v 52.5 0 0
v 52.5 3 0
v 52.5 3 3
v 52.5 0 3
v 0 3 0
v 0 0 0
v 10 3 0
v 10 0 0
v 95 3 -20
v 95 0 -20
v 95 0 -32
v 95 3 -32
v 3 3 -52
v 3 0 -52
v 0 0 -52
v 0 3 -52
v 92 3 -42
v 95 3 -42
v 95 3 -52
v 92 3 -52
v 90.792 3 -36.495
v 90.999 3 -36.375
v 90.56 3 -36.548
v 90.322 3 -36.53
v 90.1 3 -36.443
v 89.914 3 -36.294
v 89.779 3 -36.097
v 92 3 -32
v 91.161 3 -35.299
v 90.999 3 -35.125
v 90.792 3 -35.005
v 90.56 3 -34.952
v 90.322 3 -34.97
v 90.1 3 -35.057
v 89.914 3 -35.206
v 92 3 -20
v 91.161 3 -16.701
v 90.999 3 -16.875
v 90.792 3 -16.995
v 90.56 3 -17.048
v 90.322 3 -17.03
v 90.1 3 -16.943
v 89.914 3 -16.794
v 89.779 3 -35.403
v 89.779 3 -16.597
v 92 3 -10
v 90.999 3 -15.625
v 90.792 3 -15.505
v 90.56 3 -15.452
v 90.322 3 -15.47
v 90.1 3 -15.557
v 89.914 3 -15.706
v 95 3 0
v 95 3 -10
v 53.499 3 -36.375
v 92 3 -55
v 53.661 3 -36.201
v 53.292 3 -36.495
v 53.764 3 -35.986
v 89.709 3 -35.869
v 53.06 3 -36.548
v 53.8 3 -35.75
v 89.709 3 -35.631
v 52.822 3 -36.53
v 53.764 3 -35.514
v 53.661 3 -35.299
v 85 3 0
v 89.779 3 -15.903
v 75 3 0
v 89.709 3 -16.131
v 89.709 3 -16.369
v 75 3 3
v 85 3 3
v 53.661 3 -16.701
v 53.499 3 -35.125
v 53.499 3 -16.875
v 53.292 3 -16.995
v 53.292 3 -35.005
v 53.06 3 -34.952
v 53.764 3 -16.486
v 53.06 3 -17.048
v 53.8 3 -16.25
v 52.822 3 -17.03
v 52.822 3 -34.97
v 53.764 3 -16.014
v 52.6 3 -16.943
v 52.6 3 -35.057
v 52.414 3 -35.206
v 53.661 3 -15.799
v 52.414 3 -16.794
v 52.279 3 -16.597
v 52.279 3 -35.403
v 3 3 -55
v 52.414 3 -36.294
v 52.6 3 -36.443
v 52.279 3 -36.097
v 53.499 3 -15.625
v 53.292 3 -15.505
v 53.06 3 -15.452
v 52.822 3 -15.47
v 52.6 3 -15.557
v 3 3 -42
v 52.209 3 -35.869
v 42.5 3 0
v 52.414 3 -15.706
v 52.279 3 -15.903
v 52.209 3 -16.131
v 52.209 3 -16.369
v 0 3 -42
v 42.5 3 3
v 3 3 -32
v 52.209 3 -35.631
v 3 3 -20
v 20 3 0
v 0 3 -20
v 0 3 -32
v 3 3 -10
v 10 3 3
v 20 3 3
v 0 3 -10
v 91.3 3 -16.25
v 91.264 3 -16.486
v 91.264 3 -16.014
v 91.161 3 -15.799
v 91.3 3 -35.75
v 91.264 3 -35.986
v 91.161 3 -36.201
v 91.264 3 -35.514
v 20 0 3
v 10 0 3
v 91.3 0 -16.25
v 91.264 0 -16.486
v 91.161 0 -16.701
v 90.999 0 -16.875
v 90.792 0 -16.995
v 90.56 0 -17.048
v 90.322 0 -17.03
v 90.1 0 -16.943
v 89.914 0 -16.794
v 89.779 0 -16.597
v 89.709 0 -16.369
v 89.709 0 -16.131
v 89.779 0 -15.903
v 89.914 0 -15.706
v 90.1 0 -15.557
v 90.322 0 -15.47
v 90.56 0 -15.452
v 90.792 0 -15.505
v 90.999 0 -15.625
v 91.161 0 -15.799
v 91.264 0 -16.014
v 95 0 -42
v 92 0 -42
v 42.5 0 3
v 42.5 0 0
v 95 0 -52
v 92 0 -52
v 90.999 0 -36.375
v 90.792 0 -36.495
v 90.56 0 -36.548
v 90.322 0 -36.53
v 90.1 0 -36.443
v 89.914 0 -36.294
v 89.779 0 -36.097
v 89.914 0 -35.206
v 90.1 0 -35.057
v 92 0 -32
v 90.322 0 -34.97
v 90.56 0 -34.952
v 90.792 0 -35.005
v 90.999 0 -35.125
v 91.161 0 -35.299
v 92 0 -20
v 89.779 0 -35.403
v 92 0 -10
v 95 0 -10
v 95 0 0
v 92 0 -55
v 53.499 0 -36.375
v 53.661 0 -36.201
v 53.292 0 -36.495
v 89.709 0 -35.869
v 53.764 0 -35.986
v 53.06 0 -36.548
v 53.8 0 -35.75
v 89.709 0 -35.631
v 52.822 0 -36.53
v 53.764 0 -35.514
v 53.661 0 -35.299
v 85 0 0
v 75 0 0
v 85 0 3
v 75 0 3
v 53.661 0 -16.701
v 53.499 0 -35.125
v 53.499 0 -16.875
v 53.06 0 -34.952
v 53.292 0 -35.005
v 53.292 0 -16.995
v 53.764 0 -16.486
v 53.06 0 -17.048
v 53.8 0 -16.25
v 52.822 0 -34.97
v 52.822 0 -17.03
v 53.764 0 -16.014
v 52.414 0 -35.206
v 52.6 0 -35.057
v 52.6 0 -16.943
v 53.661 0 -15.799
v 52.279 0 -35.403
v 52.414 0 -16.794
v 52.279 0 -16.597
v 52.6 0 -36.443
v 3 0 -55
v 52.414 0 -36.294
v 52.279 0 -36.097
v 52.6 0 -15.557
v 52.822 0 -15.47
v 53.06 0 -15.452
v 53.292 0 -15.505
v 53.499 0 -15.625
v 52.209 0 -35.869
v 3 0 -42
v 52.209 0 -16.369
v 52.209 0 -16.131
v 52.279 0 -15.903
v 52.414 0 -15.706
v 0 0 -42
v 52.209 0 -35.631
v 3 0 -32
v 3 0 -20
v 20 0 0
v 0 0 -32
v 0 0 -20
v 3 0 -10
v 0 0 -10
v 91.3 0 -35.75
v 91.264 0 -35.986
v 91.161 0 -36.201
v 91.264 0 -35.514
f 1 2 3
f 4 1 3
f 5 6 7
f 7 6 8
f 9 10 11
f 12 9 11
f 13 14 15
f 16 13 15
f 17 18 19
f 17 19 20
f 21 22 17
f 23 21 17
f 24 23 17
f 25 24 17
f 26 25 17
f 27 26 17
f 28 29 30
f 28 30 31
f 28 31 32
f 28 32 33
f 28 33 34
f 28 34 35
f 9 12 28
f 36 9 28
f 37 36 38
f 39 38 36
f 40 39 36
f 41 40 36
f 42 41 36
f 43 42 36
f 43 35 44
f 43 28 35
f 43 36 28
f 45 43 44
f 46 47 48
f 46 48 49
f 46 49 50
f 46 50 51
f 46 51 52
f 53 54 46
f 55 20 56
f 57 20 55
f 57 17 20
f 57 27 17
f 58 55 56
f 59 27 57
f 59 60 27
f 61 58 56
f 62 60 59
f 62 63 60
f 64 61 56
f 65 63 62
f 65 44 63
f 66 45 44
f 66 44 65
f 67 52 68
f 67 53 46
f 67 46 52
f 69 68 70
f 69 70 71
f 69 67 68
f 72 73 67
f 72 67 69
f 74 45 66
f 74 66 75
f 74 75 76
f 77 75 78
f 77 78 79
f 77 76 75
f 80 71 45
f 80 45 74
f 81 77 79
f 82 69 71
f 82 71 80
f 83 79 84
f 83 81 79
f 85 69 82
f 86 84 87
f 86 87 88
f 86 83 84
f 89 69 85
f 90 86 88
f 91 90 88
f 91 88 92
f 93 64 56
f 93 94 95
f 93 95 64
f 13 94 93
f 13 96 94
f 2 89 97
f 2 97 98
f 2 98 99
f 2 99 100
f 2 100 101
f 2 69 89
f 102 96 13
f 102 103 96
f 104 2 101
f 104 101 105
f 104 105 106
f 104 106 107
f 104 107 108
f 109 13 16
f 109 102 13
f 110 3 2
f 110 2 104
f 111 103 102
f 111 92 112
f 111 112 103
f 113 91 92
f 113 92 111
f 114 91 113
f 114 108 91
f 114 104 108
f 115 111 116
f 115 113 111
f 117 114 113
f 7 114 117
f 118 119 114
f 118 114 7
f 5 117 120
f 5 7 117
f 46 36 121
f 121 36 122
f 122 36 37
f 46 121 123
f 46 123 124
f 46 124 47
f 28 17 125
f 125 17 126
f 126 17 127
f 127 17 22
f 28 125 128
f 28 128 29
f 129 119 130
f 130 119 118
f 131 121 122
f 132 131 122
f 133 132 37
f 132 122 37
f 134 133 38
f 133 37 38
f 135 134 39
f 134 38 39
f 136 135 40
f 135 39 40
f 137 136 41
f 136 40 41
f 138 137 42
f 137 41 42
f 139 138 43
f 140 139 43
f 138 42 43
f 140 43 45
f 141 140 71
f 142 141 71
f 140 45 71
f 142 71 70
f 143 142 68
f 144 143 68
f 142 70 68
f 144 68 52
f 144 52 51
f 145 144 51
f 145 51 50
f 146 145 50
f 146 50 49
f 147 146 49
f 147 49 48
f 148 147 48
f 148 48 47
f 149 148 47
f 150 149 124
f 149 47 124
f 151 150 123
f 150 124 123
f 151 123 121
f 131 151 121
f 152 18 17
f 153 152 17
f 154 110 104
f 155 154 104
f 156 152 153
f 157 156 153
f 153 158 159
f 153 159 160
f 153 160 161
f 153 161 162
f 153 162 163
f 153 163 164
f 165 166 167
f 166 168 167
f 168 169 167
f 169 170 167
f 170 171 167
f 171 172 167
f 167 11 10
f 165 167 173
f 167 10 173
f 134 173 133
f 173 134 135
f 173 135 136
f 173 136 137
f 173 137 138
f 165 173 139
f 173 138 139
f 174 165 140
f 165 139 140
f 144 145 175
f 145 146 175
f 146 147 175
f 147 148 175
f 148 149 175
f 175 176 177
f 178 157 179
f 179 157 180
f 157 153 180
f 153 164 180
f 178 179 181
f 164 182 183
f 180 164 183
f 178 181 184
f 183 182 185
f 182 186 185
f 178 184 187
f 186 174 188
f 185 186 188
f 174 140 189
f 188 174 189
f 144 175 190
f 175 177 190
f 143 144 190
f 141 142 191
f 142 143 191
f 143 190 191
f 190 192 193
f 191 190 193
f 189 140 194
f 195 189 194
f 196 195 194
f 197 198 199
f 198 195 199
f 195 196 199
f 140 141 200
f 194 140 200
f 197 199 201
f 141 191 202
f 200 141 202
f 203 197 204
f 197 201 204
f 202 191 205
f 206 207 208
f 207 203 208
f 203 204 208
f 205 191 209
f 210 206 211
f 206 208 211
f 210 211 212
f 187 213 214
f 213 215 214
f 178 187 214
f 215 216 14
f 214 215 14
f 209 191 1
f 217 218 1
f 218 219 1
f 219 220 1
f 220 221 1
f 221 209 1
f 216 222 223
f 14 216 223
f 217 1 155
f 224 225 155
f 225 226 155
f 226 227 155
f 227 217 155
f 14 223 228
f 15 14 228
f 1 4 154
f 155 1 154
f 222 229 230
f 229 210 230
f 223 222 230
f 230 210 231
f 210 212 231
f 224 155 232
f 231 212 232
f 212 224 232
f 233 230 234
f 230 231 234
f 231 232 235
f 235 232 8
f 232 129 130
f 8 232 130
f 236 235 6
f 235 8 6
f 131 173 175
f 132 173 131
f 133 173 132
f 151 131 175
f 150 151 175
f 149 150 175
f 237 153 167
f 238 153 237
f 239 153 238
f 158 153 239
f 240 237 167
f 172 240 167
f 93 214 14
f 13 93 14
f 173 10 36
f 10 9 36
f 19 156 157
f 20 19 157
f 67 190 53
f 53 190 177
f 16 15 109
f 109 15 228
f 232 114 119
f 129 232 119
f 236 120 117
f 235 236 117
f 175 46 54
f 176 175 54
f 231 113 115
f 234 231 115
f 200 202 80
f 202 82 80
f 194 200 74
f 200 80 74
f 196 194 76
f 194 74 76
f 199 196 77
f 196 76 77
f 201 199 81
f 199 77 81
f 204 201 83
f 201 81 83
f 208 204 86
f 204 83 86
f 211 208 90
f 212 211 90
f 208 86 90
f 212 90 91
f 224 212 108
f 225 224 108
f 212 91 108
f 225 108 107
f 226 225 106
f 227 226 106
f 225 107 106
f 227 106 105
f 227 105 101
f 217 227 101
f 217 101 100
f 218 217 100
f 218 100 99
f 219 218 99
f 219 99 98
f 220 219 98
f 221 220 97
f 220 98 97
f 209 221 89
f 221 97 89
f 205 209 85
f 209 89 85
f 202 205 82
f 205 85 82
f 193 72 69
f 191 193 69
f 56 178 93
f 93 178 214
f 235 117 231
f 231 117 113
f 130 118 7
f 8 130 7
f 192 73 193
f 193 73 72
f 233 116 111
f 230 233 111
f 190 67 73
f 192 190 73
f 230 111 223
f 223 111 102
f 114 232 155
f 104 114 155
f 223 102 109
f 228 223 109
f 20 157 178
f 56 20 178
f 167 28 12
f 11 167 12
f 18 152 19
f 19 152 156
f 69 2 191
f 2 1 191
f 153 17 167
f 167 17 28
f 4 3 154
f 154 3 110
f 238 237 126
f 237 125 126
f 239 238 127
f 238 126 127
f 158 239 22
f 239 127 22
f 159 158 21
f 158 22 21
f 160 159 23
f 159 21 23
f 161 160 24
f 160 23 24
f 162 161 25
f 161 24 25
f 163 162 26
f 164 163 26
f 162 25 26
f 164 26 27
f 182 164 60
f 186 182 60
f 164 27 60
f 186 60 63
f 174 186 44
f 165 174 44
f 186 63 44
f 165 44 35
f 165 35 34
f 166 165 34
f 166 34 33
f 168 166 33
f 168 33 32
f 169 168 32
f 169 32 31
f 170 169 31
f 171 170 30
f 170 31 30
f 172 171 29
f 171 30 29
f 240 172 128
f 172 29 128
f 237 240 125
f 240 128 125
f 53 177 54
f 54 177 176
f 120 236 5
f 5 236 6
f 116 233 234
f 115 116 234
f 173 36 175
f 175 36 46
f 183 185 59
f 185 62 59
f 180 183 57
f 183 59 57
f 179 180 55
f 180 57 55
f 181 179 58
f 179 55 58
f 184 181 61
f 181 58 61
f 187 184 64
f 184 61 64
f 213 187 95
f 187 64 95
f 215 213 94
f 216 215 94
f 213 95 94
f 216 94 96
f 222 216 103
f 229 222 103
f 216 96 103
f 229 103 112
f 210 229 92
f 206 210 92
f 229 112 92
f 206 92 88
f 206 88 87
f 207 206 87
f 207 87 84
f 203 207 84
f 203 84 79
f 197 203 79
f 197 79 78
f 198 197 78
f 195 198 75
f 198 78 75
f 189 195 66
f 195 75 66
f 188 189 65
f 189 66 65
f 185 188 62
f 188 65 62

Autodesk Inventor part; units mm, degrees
ref_plane "YZ Plane" through (0, 0, 0) normal (1, 0, 0) x (0, 1, 0)
ref_plane "XZ Plane" through (0, 0, 0) normal (0, 1, 0) x (-1, 0, 0)
ref_plane "XY Plane" through (0, 0, 0) normal (0, 0, 1) x (1, 0, 0)
sketch "Parede_lateral_1" plane through (0, 0, 0) normal (0, 1, 0) x (-1, 0, 0)
  line L0 (0, 0) -> (-95, 0)
  line L1 (-95, 0) -> (-95, -52)
  line L2 (-95, -52) -> (0, -52)
  line L3 (0, -52) -> (0, 0)
  dimension "d0" = 95
  dimension "d1" = 52
extrude "Extrusão1" add sketch "Parede_lateral_1" along normal blind 3
sketch "Esboço4" plane through (0, 3, 0) normal (0, 1, 0) x (1, 0, 0)
  line L0 (0, 52) -> (0, 0) projected
  line L1 (0, 42) -> (3, 42)
  line L2 (3, 42) -> (3, 32)
  line L3 (3, 32) -> (0, 32)
  line L4 (0, 32) -> (0, 42)
  line L5 (0, 20) -> (3, 20)
  line L6 (3, 20) -> (3, 10)
  line L7 (3, 10) -> (0, 10)
  line L8 (0, 10) -> (0, 20)
  line L9 (95, 0) -> (95, 52) projected
  line L10 (0, 0) -> (95, 0) projected
  line L11 (95, 42) -> (92, 42)
  line L12 (92, 42) -> (92, 32)
  line L13 (92, 32) -> (95, 32)
  line L14 (95, 32) -> (95, 42)
  line L15 (95, 20) -> (92, 20)
  line L16 (92, 20) -> (92, 10)
  line L17 (92, 10) -> (95, 10)
  line L18 (95, 10) -> (95, 20)
  line L19 (10, 0) -> (20, 0)
  line L20 (20, 0) -> (20, -3)
  line L21 (20, -3) -> (10, -3)
  line L22 (10, -3) -> (10, 0)
  line L23 (42.5, 0) -> (52.5, 0)
  line L24 (52.5, 0) -> (52.5, -3)
  line L25 (52.5, -3) -> (42.5, -3)
  line L26 (42.5, -3) -> (42.5, 0)
  line L27 (75, 0) -> (85, 0)
  line L28 (85, 0) -> (85, -3)
  line L29 (85, -3) -> (75, -3)
  line L30 (75, -3) -> (75, 0)
  point P0 (1.5, 42)
  point P1 (1.5, 10)
  dimension "d37" = 3
  dimension "d38" = 10
  dimension "d39" = 3
  dimension "d40" = 10
  dimension "d46" = 10
  dimension "d47" = 3
  dimension "d49" = 3
extrude "Extrusão4" add sketch "Esboço4" against normal blind 3 contours L10 L28 L29 L30 | L10 L24 L25 L26 | L10 L20 L21 L22
sketch "Esboço5" plane through (0, 3, 0) normal (0, 1, 0) x (1, 0, 0)
  line L0 (0, 52) -> (0, 0) projected
  line L1 (0, 10) -> (3, 10)
  line L2 (3, 10) -> (3, 20)
  line L3 (3, 20) -> (0, 20)
  line L4 (0, 20) -> (0, 10)
  line L5 (0, 32) -> (3, 32)
  line L6 (3, 32) -> (3, 42)
  line L7 (3, 42) -> (0, 42)
  line L8 (0, 42) -> (0, 32)
  line L9 (95, 52) -> (0, 52) projected
  line L10 (0, 0) -> (10, 0) projected
  line L11 (95, 0) -> (95, 52) projected
  line L12 (95, 42) -> (92, 42)
  line L13 (92, 42) -> (92, 32)
  line L14 (92, 32) -> (95, 32)
  line L15 (95, 32) -> (95, 42)
  line L16 (95, 20) -> (92, 20)
  line L17 (92, 20) -> (92, 10)
  line L18 (92, 10) -> (95, 10)
  line L19 (95, 10) -> (95, 20)
  point P0 (10, 52)
  point P1 (1.5, 42)
  point P2 (1.5, 10)
  dimension "d52" = 3
  dimension "d53" = 10
  dimension "d54" = 3
  dimension "d55" = 10
  dimension "d56" = 10
  dimension "d57" = 10
  dimension "d58" = 3
extrude "Extrusão5" cut sketch "Esboço5" against normal blind 3
sketch "Esboço17" plane through (0, 3, 0) normal (0, 1, 0) x (1, 0, 0)
  line L0 (53, 35.75) -> (90.5, 35.75)
  line L1 (90.5, 35.75) -> (90.5, 16.25)
  line L2 (90.5, 16.25) -> (53, 16.25)
  line L3 (53, 16.25) -> (53, 35.75)
  line L4 (95, 53) -> (0, 53) projected
  line L5 (92, 32) -> (92, 42) projected
  circle A0 centre (90.5, 35.75) radius 0.8
  circle A1 centre (90.5, 16.25) radius 0.8
  circle A2 centre (53, 16.25) radius 0.8
  circle A3 centre (53, 35.75) radius 0.8
  line L6 (85, 0) -> (95, 0) projected
  line L7 (95, 32) -> (92, 32) projected
  line L8 (92, 20) -> (95, 20) projected
  line L9 (52.5, 0) -> (75, 0) projected
  line L10 (95, 52) -> (0, 52) projected
  point P0 (0, 0)
  point P1 (90.5, 26)
  point P2 (93.5, 32)
  point P3 (93.5, 20)
  dimension "d130" = 37.5
  dimension "d131" = 19.5
  dimension "d133" = 1.5
  dimension "d134" = 1.6
  dimension "d135" = 1.6
  dimension "d136" = 1.6
  dimension "d137" = 1.6
  dimension "d143" = 3.75
  dimension "d144" = 3.75
  dimension "d146" = 16.25
extrude "Extrusão14" cut sketch "Esboço17" against normal blind 3 contours L3 A3 L0 | L0 A3 L3 | A0 L1 L0 | L0 L1 A0 | A2 L2 L3 | L3 L2 A2 | A1 L2 L1 | L1 L2 A1
sketch "Esboço18" plane through (0, 0, 0) normal (0, -1, 0) x (1, 0, 0)
  line L0 (0, -42) -> (3, -42) projected
  line L1 (92, -42) -> (92, -32) projected
  line L2 (92, -42) -> (92, -52)
  line L3 (3, -42) -> (3, -52)
  line L4 (95, -52) -> (0, -52) projected
  line L5 (3, -52) -> (92, -52)
  line L6 (92, -52) -> (92, -55)
  line L7 (92, -55) -> (3, -55)
  line L8 (3, -55) -> (3, -52)
  point P0 (0, 0)
  dimension "d150" = 3
extrude "Extrusão15" add sketch "Esboço18" against normal blind 3
equation "\"d146\" = -0.5 * d131 + 0.5 * d1"
properties part number "Parede_lateral_3"
